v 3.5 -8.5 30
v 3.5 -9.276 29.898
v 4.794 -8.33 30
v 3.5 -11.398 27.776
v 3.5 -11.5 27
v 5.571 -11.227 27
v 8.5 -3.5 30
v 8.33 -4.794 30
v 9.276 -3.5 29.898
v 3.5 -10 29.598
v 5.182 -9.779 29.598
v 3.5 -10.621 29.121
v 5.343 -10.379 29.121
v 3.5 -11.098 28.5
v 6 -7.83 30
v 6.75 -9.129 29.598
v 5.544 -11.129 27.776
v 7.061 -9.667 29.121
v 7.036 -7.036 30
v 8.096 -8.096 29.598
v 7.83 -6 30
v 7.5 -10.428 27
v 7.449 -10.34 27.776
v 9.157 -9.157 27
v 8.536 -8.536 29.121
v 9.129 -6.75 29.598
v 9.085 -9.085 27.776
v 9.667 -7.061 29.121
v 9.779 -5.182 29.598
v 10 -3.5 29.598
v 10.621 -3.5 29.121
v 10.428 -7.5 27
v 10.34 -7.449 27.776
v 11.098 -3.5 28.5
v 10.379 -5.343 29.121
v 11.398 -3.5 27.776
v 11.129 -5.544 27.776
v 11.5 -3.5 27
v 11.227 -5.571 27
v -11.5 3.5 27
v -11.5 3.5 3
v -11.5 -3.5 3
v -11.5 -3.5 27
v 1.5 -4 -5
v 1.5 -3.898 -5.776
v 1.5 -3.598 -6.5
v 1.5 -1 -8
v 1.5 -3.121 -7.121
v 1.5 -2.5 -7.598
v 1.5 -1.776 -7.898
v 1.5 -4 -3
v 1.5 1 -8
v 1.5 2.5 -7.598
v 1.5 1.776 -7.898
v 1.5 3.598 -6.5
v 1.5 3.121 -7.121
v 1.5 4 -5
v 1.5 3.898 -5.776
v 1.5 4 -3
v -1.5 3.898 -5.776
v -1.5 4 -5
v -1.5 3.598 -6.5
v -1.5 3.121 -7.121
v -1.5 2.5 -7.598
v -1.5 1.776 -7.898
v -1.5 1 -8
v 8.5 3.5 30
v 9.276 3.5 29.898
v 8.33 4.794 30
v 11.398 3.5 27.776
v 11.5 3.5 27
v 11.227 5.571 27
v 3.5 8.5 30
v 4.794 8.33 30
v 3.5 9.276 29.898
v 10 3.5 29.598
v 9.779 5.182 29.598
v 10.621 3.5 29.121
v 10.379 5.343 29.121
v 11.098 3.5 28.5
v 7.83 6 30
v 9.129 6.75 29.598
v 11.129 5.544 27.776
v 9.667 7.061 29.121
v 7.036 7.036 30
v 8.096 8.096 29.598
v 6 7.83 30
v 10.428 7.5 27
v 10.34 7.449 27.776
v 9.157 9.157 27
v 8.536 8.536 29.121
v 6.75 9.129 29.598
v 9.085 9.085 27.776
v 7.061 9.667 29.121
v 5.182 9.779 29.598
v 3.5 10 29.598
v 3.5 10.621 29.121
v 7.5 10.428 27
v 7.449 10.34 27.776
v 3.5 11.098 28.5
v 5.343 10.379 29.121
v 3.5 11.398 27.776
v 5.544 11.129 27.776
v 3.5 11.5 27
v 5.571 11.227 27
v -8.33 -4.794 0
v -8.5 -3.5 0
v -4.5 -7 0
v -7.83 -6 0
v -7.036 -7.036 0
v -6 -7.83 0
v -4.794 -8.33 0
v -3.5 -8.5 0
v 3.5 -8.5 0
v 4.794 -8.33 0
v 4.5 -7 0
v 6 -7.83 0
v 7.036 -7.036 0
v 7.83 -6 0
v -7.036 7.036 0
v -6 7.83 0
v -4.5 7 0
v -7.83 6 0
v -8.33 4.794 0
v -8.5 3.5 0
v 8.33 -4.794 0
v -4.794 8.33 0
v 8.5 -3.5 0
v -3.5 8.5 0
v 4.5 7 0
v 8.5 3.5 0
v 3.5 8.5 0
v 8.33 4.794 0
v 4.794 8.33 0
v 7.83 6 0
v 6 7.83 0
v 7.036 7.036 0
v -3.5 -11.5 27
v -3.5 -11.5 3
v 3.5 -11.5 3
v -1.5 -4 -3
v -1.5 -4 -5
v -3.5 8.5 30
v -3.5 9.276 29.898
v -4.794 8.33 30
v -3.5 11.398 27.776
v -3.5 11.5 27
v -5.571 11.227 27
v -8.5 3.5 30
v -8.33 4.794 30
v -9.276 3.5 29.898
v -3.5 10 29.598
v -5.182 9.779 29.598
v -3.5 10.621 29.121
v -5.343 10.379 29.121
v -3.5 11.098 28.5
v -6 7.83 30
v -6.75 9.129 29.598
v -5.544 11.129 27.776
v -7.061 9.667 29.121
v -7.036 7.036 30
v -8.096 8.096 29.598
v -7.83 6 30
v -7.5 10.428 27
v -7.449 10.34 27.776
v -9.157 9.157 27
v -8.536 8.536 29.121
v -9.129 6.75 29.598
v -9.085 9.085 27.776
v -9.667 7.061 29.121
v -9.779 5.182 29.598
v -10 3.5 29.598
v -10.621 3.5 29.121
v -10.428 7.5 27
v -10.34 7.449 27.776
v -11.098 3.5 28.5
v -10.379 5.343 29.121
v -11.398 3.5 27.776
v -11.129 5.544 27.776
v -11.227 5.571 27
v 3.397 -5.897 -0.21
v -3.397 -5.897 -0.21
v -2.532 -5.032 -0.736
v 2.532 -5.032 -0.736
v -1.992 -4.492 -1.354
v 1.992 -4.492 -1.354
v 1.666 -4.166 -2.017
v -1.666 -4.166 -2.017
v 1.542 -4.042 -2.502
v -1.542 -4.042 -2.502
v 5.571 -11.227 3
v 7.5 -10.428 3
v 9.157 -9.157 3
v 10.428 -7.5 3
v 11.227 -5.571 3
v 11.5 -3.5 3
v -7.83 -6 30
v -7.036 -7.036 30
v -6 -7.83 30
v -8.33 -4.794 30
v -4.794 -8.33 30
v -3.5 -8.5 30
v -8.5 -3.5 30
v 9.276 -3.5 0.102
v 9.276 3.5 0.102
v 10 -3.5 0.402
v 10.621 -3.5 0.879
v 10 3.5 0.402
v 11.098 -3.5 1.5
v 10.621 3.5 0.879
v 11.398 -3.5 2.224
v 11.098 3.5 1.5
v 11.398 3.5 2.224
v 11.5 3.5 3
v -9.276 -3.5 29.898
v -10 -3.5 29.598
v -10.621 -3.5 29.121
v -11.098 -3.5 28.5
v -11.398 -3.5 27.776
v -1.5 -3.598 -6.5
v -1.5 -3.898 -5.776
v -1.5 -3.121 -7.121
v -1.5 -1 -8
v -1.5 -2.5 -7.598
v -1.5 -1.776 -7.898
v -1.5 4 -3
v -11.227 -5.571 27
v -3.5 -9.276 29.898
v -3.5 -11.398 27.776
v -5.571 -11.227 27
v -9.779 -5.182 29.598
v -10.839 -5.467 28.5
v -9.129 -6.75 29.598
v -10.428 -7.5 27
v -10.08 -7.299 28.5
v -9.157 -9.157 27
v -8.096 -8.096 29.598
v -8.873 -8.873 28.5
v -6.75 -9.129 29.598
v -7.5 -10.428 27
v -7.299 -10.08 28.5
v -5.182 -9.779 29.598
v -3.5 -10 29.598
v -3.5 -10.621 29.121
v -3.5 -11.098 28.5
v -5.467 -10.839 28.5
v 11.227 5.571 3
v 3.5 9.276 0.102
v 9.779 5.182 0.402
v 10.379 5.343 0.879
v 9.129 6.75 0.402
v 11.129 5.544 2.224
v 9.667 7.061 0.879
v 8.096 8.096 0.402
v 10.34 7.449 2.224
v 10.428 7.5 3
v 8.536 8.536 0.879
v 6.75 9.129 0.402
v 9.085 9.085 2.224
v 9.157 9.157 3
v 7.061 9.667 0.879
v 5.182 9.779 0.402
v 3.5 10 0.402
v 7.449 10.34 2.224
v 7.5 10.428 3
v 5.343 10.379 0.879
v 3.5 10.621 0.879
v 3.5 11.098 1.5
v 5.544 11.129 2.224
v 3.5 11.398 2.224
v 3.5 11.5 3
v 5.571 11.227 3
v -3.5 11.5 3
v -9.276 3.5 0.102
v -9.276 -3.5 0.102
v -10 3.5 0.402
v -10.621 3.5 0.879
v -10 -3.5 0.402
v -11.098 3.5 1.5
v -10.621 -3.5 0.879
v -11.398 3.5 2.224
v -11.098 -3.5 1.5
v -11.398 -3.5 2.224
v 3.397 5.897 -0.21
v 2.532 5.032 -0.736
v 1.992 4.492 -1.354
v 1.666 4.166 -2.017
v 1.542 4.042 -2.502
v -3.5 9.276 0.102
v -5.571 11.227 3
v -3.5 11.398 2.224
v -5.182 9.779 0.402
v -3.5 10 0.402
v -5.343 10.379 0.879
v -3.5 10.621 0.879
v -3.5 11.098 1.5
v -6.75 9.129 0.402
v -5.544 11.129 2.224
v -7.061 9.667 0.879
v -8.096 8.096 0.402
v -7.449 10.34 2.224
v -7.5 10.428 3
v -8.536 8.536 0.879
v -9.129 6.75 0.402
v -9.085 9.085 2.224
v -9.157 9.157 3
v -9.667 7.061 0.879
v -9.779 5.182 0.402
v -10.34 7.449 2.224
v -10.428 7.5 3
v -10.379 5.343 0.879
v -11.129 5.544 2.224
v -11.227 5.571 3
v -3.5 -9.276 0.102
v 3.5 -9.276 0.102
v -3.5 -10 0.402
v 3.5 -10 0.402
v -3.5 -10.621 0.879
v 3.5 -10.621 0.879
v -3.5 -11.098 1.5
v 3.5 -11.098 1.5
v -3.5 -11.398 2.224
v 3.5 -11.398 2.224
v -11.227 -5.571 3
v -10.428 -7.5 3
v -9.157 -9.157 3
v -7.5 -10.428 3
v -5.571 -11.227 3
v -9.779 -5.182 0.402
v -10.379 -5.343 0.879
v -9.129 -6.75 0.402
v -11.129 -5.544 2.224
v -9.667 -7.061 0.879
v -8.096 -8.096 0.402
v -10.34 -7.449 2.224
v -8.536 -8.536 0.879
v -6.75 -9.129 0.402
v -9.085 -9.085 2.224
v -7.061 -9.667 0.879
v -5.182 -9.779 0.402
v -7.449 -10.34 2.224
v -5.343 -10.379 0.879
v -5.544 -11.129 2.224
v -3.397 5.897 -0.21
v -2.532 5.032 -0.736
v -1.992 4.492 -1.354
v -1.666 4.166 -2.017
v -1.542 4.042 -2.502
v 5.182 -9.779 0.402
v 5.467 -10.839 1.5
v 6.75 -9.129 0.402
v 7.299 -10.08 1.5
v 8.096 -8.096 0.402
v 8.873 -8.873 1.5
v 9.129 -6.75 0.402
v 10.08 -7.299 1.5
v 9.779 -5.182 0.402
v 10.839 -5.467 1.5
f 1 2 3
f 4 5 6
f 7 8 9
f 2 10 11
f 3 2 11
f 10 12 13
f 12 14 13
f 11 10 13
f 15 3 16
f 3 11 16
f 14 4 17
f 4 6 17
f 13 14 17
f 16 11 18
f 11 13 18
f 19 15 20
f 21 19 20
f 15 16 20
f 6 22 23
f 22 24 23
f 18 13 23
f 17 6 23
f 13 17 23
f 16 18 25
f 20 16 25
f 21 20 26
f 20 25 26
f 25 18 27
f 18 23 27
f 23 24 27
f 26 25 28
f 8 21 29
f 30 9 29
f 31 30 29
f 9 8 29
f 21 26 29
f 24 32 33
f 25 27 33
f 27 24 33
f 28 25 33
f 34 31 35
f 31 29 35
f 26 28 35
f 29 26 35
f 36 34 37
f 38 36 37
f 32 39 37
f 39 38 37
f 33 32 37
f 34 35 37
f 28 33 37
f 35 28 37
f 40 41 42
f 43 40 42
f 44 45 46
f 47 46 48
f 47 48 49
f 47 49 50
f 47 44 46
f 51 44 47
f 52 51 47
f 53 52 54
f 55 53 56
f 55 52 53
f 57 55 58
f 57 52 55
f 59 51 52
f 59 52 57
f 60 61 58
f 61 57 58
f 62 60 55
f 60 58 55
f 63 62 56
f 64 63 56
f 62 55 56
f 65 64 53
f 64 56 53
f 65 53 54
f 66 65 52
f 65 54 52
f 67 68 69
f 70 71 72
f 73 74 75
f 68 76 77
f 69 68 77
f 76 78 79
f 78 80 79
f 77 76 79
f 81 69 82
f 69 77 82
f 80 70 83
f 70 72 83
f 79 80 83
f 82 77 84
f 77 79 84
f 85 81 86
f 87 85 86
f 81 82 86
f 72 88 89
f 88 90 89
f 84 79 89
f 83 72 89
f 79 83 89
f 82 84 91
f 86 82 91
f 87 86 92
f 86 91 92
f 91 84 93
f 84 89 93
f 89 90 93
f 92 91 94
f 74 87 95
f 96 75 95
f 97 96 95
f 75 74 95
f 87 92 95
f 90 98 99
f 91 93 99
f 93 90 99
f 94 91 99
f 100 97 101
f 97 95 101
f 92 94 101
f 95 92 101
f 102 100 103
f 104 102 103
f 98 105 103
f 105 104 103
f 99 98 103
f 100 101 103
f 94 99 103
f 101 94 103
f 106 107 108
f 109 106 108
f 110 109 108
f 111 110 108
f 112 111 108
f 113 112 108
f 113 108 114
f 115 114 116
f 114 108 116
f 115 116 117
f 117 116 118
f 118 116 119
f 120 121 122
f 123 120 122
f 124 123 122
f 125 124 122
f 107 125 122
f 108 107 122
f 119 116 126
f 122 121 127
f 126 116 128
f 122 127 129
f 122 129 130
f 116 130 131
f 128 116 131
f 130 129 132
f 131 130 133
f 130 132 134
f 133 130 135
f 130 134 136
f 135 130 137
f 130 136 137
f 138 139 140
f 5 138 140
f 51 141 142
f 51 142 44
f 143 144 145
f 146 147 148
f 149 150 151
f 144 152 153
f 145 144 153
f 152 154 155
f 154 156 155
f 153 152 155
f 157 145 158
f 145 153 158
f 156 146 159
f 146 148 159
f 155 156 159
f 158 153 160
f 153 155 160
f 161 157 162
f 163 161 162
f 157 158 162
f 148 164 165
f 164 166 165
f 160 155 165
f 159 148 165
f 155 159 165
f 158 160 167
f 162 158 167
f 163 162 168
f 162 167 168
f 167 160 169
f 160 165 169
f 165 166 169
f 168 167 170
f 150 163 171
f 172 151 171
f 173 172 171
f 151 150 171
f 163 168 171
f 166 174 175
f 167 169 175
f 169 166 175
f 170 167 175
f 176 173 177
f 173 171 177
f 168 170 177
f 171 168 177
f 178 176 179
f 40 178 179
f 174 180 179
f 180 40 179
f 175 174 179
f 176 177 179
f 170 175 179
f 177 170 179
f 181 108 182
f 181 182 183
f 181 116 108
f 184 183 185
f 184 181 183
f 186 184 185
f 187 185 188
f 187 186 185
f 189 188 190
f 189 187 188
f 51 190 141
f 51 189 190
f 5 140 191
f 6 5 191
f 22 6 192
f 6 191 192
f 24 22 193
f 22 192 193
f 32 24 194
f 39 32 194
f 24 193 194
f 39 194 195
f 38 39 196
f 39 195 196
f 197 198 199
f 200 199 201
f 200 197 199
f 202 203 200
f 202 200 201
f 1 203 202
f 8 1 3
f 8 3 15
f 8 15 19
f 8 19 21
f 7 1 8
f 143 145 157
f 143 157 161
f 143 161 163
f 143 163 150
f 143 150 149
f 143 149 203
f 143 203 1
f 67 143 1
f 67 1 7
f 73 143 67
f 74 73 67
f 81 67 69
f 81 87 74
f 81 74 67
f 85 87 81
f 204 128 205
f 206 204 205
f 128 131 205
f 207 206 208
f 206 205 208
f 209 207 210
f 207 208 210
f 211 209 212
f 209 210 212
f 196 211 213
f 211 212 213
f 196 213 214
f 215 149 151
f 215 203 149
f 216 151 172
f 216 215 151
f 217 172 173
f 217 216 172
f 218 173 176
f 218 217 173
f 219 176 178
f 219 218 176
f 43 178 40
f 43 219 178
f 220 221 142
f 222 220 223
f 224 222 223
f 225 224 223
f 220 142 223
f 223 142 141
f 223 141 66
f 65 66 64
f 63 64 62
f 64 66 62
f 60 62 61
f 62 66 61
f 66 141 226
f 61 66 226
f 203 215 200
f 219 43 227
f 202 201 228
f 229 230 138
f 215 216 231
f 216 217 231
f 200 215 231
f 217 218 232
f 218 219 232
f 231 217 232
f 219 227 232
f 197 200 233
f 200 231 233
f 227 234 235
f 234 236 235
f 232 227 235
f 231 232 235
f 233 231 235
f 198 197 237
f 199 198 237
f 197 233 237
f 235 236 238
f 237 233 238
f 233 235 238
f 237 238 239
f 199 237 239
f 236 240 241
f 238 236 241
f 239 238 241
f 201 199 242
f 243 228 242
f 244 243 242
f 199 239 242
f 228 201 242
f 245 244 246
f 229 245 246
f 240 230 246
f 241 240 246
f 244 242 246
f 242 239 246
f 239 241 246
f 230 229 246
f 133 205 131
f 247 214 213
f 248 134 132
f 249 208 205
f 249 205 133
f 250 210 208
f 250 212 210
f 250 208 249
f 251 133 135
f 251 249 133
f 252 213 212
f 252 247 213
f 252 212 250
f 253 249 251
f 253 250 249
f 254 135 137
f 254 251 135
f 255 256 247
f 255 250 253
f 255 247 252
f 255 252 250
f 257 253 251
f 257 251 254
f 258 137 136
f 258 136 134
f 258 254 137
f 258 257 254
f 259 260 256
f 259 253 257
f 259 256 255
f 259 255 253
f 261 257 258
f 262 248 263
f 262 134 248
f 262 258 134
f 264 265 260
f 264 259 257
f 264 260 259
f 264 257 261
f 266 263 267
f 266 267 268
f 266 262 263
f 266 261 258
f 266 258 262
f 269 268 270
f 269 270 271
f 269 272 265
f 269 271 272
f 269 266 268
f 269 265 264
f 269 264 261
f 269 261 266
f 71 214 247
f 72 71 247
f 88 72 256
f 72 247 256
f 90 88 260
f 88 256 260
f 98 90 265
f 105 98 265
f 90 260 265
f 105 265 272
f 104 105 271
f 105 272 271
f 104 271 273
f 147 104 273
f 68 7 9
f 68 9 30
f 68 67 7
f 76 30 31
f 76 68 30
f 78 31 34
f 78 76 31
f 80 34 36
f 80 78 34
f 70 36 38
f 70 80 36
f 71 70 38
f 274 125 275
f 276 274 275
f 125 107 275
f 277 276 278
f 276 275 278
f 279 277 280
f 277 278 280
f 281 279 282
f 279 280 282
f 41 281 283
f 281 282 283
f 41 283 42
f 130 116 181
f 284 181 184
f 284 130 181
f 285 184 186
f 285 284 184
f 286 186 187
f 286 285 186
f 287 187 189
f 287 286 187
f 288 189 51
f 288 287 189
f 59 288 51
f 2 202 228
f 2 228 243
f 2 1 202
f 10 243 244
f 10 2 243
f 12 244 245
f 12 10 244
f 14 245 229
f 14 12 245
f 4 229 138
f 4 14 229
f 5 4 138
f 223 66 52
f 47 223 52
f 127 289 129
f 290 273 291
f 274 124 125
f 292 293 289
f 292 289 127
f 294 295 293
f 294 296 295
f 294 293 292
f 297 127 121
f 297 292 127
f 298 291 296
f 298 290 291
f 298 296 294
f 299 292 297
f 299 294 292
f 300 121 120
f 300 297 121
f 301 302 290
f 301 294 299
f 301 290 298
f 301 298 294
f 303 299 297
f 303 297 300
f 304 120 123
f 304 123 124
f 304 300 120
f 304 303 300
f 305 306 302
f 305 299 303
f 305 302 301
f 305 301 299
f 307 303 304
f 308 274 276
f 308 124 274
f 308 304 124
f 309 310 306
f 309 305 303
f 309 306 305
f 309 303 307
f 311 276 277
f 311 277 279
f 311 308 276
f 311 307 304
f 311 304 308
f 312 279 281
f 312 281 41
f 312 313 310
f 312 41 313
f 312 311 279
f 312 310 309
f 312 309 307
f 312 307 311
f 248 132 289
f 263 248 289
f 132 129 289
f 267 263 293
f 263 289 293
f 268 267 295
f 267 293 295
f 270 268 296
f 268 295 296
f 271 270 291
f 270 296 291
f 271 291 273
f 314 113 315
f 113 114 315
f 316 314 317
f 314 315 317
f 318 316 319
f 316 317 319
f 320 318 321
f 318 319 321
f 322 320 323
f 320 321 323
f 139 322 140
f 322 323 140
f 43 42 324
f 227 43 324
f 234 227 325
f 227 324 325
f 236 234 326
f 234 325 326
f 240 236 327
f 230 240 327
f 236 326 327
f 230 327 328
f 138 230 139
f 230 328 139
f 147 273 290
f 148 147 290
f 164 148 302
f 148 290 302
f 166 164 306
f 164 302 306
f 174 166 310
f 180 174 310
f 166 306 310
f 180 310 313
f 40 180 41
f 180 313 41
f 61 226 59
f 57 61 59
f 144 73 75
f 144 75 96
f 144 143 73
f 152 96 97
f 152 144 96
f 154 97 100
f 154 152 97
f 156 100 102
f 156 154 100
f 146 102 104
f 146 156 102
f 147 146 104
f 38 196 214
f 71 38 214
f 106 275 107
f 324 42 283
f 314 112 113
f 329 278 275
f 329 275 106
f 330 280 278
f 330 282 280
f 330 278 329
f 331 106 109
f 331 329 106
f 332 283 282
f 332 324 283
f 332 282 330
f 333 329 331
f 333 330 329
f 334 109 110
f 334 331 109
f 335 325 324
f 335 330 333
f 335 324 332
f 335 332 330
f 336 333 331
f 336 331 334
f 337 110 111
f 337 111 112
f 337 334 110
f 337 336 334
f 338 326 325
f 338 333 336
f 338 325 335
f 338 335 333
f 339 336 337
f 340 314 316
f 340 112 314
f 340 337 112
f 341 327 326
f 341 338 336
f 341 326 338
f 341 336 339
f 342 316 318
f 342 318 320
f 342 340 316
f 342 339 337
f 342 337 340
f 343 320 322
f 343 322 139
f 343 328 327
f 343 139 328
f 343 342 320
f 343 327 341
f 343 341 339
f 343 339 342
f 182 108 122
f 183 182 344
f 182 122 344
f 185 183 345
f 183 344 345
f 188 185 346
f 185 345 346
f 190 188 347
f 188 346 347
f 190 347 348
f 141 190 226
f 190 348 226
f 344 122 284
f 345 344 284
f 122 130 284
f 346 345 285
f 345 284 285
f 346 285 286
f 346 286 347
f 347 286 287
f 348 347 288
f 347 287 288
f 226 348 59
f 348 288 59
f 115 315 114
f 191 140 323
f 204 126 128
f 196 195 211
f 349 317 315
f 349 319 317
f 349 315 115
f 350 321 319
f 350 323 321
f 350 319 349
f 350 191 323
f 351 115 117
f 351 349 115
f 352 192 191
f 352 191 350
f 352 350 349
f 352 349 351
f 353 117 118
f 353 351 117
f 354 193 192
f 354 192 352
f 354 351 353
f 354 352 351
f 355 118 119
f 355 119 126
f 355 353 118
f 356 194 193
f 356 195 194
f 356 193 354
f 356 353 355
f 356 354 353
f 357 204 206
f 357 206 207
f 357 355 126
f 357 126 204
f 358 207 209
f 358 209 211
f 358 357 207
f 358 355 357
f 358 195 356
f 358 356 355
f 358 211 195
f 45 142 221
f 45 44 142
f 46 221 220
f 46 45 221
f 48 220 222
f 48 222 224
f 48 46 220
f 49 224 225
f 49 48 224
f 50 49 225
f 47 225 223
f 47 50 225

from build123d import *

# Parameters (mm, degrees)
F1_DEPTH = 30
F2_W     = 3
F2_H     = 8
F3_DEPTH = 8
F4_R     = 3


with BuildPart() as f1:
    # F0 (on Top) → F1 (new body)
    with BuildSketch(Plane.XY):
        with BuildLine():
            ThreePointArc((11.5, 3.5), (9.156854, 9.156854), (3.5, 11.5))
            Line((3.5, 11.5), (-3.5, 11.5))
            ThreePointArc((-3.5, 11.5), (-9.156854, 9.156854), (-11.5, 3.5))
            Line((-11.5, 3.5), (-11.5, -3.5))
            ThreePointArc((-11.5, -3.5), (-9.156854, -9.156854), (-3.5, -11.5))
            Line((-3.5, -11.5), (3.5, -11.5))
            ThreePointArc((3.5, -11.5), (9.156854, -9.156854), (11.5, -3.5))
            Line((11.5, -3.5), (11.5, 3.5))
        make_face()
    extrude(amount=F1_DEPTH)

    # F2 (on Top) → F3 (join)
    with BuildSketch(Plane.XY):
        Rectangle(F2_W, F2_H)
    extrude(amount=-F3_DEPTH)

    # F4
    f4_edges = [f1.edges().sort_by_distance(p)[0] for p in [
        (-9.156854, -9.156854, 30),
        (9.156854, -9.156854, 0),
        (-1.5, 0, 0),
        (0, -4, 0),
        (1.5, 0, 0),
        (0, 4, 0),
        (0, 4, -8),
        (0, -4, -8),
    ]]
    fillet(f4_edges, radius=F4_R)


solid = f1.part
